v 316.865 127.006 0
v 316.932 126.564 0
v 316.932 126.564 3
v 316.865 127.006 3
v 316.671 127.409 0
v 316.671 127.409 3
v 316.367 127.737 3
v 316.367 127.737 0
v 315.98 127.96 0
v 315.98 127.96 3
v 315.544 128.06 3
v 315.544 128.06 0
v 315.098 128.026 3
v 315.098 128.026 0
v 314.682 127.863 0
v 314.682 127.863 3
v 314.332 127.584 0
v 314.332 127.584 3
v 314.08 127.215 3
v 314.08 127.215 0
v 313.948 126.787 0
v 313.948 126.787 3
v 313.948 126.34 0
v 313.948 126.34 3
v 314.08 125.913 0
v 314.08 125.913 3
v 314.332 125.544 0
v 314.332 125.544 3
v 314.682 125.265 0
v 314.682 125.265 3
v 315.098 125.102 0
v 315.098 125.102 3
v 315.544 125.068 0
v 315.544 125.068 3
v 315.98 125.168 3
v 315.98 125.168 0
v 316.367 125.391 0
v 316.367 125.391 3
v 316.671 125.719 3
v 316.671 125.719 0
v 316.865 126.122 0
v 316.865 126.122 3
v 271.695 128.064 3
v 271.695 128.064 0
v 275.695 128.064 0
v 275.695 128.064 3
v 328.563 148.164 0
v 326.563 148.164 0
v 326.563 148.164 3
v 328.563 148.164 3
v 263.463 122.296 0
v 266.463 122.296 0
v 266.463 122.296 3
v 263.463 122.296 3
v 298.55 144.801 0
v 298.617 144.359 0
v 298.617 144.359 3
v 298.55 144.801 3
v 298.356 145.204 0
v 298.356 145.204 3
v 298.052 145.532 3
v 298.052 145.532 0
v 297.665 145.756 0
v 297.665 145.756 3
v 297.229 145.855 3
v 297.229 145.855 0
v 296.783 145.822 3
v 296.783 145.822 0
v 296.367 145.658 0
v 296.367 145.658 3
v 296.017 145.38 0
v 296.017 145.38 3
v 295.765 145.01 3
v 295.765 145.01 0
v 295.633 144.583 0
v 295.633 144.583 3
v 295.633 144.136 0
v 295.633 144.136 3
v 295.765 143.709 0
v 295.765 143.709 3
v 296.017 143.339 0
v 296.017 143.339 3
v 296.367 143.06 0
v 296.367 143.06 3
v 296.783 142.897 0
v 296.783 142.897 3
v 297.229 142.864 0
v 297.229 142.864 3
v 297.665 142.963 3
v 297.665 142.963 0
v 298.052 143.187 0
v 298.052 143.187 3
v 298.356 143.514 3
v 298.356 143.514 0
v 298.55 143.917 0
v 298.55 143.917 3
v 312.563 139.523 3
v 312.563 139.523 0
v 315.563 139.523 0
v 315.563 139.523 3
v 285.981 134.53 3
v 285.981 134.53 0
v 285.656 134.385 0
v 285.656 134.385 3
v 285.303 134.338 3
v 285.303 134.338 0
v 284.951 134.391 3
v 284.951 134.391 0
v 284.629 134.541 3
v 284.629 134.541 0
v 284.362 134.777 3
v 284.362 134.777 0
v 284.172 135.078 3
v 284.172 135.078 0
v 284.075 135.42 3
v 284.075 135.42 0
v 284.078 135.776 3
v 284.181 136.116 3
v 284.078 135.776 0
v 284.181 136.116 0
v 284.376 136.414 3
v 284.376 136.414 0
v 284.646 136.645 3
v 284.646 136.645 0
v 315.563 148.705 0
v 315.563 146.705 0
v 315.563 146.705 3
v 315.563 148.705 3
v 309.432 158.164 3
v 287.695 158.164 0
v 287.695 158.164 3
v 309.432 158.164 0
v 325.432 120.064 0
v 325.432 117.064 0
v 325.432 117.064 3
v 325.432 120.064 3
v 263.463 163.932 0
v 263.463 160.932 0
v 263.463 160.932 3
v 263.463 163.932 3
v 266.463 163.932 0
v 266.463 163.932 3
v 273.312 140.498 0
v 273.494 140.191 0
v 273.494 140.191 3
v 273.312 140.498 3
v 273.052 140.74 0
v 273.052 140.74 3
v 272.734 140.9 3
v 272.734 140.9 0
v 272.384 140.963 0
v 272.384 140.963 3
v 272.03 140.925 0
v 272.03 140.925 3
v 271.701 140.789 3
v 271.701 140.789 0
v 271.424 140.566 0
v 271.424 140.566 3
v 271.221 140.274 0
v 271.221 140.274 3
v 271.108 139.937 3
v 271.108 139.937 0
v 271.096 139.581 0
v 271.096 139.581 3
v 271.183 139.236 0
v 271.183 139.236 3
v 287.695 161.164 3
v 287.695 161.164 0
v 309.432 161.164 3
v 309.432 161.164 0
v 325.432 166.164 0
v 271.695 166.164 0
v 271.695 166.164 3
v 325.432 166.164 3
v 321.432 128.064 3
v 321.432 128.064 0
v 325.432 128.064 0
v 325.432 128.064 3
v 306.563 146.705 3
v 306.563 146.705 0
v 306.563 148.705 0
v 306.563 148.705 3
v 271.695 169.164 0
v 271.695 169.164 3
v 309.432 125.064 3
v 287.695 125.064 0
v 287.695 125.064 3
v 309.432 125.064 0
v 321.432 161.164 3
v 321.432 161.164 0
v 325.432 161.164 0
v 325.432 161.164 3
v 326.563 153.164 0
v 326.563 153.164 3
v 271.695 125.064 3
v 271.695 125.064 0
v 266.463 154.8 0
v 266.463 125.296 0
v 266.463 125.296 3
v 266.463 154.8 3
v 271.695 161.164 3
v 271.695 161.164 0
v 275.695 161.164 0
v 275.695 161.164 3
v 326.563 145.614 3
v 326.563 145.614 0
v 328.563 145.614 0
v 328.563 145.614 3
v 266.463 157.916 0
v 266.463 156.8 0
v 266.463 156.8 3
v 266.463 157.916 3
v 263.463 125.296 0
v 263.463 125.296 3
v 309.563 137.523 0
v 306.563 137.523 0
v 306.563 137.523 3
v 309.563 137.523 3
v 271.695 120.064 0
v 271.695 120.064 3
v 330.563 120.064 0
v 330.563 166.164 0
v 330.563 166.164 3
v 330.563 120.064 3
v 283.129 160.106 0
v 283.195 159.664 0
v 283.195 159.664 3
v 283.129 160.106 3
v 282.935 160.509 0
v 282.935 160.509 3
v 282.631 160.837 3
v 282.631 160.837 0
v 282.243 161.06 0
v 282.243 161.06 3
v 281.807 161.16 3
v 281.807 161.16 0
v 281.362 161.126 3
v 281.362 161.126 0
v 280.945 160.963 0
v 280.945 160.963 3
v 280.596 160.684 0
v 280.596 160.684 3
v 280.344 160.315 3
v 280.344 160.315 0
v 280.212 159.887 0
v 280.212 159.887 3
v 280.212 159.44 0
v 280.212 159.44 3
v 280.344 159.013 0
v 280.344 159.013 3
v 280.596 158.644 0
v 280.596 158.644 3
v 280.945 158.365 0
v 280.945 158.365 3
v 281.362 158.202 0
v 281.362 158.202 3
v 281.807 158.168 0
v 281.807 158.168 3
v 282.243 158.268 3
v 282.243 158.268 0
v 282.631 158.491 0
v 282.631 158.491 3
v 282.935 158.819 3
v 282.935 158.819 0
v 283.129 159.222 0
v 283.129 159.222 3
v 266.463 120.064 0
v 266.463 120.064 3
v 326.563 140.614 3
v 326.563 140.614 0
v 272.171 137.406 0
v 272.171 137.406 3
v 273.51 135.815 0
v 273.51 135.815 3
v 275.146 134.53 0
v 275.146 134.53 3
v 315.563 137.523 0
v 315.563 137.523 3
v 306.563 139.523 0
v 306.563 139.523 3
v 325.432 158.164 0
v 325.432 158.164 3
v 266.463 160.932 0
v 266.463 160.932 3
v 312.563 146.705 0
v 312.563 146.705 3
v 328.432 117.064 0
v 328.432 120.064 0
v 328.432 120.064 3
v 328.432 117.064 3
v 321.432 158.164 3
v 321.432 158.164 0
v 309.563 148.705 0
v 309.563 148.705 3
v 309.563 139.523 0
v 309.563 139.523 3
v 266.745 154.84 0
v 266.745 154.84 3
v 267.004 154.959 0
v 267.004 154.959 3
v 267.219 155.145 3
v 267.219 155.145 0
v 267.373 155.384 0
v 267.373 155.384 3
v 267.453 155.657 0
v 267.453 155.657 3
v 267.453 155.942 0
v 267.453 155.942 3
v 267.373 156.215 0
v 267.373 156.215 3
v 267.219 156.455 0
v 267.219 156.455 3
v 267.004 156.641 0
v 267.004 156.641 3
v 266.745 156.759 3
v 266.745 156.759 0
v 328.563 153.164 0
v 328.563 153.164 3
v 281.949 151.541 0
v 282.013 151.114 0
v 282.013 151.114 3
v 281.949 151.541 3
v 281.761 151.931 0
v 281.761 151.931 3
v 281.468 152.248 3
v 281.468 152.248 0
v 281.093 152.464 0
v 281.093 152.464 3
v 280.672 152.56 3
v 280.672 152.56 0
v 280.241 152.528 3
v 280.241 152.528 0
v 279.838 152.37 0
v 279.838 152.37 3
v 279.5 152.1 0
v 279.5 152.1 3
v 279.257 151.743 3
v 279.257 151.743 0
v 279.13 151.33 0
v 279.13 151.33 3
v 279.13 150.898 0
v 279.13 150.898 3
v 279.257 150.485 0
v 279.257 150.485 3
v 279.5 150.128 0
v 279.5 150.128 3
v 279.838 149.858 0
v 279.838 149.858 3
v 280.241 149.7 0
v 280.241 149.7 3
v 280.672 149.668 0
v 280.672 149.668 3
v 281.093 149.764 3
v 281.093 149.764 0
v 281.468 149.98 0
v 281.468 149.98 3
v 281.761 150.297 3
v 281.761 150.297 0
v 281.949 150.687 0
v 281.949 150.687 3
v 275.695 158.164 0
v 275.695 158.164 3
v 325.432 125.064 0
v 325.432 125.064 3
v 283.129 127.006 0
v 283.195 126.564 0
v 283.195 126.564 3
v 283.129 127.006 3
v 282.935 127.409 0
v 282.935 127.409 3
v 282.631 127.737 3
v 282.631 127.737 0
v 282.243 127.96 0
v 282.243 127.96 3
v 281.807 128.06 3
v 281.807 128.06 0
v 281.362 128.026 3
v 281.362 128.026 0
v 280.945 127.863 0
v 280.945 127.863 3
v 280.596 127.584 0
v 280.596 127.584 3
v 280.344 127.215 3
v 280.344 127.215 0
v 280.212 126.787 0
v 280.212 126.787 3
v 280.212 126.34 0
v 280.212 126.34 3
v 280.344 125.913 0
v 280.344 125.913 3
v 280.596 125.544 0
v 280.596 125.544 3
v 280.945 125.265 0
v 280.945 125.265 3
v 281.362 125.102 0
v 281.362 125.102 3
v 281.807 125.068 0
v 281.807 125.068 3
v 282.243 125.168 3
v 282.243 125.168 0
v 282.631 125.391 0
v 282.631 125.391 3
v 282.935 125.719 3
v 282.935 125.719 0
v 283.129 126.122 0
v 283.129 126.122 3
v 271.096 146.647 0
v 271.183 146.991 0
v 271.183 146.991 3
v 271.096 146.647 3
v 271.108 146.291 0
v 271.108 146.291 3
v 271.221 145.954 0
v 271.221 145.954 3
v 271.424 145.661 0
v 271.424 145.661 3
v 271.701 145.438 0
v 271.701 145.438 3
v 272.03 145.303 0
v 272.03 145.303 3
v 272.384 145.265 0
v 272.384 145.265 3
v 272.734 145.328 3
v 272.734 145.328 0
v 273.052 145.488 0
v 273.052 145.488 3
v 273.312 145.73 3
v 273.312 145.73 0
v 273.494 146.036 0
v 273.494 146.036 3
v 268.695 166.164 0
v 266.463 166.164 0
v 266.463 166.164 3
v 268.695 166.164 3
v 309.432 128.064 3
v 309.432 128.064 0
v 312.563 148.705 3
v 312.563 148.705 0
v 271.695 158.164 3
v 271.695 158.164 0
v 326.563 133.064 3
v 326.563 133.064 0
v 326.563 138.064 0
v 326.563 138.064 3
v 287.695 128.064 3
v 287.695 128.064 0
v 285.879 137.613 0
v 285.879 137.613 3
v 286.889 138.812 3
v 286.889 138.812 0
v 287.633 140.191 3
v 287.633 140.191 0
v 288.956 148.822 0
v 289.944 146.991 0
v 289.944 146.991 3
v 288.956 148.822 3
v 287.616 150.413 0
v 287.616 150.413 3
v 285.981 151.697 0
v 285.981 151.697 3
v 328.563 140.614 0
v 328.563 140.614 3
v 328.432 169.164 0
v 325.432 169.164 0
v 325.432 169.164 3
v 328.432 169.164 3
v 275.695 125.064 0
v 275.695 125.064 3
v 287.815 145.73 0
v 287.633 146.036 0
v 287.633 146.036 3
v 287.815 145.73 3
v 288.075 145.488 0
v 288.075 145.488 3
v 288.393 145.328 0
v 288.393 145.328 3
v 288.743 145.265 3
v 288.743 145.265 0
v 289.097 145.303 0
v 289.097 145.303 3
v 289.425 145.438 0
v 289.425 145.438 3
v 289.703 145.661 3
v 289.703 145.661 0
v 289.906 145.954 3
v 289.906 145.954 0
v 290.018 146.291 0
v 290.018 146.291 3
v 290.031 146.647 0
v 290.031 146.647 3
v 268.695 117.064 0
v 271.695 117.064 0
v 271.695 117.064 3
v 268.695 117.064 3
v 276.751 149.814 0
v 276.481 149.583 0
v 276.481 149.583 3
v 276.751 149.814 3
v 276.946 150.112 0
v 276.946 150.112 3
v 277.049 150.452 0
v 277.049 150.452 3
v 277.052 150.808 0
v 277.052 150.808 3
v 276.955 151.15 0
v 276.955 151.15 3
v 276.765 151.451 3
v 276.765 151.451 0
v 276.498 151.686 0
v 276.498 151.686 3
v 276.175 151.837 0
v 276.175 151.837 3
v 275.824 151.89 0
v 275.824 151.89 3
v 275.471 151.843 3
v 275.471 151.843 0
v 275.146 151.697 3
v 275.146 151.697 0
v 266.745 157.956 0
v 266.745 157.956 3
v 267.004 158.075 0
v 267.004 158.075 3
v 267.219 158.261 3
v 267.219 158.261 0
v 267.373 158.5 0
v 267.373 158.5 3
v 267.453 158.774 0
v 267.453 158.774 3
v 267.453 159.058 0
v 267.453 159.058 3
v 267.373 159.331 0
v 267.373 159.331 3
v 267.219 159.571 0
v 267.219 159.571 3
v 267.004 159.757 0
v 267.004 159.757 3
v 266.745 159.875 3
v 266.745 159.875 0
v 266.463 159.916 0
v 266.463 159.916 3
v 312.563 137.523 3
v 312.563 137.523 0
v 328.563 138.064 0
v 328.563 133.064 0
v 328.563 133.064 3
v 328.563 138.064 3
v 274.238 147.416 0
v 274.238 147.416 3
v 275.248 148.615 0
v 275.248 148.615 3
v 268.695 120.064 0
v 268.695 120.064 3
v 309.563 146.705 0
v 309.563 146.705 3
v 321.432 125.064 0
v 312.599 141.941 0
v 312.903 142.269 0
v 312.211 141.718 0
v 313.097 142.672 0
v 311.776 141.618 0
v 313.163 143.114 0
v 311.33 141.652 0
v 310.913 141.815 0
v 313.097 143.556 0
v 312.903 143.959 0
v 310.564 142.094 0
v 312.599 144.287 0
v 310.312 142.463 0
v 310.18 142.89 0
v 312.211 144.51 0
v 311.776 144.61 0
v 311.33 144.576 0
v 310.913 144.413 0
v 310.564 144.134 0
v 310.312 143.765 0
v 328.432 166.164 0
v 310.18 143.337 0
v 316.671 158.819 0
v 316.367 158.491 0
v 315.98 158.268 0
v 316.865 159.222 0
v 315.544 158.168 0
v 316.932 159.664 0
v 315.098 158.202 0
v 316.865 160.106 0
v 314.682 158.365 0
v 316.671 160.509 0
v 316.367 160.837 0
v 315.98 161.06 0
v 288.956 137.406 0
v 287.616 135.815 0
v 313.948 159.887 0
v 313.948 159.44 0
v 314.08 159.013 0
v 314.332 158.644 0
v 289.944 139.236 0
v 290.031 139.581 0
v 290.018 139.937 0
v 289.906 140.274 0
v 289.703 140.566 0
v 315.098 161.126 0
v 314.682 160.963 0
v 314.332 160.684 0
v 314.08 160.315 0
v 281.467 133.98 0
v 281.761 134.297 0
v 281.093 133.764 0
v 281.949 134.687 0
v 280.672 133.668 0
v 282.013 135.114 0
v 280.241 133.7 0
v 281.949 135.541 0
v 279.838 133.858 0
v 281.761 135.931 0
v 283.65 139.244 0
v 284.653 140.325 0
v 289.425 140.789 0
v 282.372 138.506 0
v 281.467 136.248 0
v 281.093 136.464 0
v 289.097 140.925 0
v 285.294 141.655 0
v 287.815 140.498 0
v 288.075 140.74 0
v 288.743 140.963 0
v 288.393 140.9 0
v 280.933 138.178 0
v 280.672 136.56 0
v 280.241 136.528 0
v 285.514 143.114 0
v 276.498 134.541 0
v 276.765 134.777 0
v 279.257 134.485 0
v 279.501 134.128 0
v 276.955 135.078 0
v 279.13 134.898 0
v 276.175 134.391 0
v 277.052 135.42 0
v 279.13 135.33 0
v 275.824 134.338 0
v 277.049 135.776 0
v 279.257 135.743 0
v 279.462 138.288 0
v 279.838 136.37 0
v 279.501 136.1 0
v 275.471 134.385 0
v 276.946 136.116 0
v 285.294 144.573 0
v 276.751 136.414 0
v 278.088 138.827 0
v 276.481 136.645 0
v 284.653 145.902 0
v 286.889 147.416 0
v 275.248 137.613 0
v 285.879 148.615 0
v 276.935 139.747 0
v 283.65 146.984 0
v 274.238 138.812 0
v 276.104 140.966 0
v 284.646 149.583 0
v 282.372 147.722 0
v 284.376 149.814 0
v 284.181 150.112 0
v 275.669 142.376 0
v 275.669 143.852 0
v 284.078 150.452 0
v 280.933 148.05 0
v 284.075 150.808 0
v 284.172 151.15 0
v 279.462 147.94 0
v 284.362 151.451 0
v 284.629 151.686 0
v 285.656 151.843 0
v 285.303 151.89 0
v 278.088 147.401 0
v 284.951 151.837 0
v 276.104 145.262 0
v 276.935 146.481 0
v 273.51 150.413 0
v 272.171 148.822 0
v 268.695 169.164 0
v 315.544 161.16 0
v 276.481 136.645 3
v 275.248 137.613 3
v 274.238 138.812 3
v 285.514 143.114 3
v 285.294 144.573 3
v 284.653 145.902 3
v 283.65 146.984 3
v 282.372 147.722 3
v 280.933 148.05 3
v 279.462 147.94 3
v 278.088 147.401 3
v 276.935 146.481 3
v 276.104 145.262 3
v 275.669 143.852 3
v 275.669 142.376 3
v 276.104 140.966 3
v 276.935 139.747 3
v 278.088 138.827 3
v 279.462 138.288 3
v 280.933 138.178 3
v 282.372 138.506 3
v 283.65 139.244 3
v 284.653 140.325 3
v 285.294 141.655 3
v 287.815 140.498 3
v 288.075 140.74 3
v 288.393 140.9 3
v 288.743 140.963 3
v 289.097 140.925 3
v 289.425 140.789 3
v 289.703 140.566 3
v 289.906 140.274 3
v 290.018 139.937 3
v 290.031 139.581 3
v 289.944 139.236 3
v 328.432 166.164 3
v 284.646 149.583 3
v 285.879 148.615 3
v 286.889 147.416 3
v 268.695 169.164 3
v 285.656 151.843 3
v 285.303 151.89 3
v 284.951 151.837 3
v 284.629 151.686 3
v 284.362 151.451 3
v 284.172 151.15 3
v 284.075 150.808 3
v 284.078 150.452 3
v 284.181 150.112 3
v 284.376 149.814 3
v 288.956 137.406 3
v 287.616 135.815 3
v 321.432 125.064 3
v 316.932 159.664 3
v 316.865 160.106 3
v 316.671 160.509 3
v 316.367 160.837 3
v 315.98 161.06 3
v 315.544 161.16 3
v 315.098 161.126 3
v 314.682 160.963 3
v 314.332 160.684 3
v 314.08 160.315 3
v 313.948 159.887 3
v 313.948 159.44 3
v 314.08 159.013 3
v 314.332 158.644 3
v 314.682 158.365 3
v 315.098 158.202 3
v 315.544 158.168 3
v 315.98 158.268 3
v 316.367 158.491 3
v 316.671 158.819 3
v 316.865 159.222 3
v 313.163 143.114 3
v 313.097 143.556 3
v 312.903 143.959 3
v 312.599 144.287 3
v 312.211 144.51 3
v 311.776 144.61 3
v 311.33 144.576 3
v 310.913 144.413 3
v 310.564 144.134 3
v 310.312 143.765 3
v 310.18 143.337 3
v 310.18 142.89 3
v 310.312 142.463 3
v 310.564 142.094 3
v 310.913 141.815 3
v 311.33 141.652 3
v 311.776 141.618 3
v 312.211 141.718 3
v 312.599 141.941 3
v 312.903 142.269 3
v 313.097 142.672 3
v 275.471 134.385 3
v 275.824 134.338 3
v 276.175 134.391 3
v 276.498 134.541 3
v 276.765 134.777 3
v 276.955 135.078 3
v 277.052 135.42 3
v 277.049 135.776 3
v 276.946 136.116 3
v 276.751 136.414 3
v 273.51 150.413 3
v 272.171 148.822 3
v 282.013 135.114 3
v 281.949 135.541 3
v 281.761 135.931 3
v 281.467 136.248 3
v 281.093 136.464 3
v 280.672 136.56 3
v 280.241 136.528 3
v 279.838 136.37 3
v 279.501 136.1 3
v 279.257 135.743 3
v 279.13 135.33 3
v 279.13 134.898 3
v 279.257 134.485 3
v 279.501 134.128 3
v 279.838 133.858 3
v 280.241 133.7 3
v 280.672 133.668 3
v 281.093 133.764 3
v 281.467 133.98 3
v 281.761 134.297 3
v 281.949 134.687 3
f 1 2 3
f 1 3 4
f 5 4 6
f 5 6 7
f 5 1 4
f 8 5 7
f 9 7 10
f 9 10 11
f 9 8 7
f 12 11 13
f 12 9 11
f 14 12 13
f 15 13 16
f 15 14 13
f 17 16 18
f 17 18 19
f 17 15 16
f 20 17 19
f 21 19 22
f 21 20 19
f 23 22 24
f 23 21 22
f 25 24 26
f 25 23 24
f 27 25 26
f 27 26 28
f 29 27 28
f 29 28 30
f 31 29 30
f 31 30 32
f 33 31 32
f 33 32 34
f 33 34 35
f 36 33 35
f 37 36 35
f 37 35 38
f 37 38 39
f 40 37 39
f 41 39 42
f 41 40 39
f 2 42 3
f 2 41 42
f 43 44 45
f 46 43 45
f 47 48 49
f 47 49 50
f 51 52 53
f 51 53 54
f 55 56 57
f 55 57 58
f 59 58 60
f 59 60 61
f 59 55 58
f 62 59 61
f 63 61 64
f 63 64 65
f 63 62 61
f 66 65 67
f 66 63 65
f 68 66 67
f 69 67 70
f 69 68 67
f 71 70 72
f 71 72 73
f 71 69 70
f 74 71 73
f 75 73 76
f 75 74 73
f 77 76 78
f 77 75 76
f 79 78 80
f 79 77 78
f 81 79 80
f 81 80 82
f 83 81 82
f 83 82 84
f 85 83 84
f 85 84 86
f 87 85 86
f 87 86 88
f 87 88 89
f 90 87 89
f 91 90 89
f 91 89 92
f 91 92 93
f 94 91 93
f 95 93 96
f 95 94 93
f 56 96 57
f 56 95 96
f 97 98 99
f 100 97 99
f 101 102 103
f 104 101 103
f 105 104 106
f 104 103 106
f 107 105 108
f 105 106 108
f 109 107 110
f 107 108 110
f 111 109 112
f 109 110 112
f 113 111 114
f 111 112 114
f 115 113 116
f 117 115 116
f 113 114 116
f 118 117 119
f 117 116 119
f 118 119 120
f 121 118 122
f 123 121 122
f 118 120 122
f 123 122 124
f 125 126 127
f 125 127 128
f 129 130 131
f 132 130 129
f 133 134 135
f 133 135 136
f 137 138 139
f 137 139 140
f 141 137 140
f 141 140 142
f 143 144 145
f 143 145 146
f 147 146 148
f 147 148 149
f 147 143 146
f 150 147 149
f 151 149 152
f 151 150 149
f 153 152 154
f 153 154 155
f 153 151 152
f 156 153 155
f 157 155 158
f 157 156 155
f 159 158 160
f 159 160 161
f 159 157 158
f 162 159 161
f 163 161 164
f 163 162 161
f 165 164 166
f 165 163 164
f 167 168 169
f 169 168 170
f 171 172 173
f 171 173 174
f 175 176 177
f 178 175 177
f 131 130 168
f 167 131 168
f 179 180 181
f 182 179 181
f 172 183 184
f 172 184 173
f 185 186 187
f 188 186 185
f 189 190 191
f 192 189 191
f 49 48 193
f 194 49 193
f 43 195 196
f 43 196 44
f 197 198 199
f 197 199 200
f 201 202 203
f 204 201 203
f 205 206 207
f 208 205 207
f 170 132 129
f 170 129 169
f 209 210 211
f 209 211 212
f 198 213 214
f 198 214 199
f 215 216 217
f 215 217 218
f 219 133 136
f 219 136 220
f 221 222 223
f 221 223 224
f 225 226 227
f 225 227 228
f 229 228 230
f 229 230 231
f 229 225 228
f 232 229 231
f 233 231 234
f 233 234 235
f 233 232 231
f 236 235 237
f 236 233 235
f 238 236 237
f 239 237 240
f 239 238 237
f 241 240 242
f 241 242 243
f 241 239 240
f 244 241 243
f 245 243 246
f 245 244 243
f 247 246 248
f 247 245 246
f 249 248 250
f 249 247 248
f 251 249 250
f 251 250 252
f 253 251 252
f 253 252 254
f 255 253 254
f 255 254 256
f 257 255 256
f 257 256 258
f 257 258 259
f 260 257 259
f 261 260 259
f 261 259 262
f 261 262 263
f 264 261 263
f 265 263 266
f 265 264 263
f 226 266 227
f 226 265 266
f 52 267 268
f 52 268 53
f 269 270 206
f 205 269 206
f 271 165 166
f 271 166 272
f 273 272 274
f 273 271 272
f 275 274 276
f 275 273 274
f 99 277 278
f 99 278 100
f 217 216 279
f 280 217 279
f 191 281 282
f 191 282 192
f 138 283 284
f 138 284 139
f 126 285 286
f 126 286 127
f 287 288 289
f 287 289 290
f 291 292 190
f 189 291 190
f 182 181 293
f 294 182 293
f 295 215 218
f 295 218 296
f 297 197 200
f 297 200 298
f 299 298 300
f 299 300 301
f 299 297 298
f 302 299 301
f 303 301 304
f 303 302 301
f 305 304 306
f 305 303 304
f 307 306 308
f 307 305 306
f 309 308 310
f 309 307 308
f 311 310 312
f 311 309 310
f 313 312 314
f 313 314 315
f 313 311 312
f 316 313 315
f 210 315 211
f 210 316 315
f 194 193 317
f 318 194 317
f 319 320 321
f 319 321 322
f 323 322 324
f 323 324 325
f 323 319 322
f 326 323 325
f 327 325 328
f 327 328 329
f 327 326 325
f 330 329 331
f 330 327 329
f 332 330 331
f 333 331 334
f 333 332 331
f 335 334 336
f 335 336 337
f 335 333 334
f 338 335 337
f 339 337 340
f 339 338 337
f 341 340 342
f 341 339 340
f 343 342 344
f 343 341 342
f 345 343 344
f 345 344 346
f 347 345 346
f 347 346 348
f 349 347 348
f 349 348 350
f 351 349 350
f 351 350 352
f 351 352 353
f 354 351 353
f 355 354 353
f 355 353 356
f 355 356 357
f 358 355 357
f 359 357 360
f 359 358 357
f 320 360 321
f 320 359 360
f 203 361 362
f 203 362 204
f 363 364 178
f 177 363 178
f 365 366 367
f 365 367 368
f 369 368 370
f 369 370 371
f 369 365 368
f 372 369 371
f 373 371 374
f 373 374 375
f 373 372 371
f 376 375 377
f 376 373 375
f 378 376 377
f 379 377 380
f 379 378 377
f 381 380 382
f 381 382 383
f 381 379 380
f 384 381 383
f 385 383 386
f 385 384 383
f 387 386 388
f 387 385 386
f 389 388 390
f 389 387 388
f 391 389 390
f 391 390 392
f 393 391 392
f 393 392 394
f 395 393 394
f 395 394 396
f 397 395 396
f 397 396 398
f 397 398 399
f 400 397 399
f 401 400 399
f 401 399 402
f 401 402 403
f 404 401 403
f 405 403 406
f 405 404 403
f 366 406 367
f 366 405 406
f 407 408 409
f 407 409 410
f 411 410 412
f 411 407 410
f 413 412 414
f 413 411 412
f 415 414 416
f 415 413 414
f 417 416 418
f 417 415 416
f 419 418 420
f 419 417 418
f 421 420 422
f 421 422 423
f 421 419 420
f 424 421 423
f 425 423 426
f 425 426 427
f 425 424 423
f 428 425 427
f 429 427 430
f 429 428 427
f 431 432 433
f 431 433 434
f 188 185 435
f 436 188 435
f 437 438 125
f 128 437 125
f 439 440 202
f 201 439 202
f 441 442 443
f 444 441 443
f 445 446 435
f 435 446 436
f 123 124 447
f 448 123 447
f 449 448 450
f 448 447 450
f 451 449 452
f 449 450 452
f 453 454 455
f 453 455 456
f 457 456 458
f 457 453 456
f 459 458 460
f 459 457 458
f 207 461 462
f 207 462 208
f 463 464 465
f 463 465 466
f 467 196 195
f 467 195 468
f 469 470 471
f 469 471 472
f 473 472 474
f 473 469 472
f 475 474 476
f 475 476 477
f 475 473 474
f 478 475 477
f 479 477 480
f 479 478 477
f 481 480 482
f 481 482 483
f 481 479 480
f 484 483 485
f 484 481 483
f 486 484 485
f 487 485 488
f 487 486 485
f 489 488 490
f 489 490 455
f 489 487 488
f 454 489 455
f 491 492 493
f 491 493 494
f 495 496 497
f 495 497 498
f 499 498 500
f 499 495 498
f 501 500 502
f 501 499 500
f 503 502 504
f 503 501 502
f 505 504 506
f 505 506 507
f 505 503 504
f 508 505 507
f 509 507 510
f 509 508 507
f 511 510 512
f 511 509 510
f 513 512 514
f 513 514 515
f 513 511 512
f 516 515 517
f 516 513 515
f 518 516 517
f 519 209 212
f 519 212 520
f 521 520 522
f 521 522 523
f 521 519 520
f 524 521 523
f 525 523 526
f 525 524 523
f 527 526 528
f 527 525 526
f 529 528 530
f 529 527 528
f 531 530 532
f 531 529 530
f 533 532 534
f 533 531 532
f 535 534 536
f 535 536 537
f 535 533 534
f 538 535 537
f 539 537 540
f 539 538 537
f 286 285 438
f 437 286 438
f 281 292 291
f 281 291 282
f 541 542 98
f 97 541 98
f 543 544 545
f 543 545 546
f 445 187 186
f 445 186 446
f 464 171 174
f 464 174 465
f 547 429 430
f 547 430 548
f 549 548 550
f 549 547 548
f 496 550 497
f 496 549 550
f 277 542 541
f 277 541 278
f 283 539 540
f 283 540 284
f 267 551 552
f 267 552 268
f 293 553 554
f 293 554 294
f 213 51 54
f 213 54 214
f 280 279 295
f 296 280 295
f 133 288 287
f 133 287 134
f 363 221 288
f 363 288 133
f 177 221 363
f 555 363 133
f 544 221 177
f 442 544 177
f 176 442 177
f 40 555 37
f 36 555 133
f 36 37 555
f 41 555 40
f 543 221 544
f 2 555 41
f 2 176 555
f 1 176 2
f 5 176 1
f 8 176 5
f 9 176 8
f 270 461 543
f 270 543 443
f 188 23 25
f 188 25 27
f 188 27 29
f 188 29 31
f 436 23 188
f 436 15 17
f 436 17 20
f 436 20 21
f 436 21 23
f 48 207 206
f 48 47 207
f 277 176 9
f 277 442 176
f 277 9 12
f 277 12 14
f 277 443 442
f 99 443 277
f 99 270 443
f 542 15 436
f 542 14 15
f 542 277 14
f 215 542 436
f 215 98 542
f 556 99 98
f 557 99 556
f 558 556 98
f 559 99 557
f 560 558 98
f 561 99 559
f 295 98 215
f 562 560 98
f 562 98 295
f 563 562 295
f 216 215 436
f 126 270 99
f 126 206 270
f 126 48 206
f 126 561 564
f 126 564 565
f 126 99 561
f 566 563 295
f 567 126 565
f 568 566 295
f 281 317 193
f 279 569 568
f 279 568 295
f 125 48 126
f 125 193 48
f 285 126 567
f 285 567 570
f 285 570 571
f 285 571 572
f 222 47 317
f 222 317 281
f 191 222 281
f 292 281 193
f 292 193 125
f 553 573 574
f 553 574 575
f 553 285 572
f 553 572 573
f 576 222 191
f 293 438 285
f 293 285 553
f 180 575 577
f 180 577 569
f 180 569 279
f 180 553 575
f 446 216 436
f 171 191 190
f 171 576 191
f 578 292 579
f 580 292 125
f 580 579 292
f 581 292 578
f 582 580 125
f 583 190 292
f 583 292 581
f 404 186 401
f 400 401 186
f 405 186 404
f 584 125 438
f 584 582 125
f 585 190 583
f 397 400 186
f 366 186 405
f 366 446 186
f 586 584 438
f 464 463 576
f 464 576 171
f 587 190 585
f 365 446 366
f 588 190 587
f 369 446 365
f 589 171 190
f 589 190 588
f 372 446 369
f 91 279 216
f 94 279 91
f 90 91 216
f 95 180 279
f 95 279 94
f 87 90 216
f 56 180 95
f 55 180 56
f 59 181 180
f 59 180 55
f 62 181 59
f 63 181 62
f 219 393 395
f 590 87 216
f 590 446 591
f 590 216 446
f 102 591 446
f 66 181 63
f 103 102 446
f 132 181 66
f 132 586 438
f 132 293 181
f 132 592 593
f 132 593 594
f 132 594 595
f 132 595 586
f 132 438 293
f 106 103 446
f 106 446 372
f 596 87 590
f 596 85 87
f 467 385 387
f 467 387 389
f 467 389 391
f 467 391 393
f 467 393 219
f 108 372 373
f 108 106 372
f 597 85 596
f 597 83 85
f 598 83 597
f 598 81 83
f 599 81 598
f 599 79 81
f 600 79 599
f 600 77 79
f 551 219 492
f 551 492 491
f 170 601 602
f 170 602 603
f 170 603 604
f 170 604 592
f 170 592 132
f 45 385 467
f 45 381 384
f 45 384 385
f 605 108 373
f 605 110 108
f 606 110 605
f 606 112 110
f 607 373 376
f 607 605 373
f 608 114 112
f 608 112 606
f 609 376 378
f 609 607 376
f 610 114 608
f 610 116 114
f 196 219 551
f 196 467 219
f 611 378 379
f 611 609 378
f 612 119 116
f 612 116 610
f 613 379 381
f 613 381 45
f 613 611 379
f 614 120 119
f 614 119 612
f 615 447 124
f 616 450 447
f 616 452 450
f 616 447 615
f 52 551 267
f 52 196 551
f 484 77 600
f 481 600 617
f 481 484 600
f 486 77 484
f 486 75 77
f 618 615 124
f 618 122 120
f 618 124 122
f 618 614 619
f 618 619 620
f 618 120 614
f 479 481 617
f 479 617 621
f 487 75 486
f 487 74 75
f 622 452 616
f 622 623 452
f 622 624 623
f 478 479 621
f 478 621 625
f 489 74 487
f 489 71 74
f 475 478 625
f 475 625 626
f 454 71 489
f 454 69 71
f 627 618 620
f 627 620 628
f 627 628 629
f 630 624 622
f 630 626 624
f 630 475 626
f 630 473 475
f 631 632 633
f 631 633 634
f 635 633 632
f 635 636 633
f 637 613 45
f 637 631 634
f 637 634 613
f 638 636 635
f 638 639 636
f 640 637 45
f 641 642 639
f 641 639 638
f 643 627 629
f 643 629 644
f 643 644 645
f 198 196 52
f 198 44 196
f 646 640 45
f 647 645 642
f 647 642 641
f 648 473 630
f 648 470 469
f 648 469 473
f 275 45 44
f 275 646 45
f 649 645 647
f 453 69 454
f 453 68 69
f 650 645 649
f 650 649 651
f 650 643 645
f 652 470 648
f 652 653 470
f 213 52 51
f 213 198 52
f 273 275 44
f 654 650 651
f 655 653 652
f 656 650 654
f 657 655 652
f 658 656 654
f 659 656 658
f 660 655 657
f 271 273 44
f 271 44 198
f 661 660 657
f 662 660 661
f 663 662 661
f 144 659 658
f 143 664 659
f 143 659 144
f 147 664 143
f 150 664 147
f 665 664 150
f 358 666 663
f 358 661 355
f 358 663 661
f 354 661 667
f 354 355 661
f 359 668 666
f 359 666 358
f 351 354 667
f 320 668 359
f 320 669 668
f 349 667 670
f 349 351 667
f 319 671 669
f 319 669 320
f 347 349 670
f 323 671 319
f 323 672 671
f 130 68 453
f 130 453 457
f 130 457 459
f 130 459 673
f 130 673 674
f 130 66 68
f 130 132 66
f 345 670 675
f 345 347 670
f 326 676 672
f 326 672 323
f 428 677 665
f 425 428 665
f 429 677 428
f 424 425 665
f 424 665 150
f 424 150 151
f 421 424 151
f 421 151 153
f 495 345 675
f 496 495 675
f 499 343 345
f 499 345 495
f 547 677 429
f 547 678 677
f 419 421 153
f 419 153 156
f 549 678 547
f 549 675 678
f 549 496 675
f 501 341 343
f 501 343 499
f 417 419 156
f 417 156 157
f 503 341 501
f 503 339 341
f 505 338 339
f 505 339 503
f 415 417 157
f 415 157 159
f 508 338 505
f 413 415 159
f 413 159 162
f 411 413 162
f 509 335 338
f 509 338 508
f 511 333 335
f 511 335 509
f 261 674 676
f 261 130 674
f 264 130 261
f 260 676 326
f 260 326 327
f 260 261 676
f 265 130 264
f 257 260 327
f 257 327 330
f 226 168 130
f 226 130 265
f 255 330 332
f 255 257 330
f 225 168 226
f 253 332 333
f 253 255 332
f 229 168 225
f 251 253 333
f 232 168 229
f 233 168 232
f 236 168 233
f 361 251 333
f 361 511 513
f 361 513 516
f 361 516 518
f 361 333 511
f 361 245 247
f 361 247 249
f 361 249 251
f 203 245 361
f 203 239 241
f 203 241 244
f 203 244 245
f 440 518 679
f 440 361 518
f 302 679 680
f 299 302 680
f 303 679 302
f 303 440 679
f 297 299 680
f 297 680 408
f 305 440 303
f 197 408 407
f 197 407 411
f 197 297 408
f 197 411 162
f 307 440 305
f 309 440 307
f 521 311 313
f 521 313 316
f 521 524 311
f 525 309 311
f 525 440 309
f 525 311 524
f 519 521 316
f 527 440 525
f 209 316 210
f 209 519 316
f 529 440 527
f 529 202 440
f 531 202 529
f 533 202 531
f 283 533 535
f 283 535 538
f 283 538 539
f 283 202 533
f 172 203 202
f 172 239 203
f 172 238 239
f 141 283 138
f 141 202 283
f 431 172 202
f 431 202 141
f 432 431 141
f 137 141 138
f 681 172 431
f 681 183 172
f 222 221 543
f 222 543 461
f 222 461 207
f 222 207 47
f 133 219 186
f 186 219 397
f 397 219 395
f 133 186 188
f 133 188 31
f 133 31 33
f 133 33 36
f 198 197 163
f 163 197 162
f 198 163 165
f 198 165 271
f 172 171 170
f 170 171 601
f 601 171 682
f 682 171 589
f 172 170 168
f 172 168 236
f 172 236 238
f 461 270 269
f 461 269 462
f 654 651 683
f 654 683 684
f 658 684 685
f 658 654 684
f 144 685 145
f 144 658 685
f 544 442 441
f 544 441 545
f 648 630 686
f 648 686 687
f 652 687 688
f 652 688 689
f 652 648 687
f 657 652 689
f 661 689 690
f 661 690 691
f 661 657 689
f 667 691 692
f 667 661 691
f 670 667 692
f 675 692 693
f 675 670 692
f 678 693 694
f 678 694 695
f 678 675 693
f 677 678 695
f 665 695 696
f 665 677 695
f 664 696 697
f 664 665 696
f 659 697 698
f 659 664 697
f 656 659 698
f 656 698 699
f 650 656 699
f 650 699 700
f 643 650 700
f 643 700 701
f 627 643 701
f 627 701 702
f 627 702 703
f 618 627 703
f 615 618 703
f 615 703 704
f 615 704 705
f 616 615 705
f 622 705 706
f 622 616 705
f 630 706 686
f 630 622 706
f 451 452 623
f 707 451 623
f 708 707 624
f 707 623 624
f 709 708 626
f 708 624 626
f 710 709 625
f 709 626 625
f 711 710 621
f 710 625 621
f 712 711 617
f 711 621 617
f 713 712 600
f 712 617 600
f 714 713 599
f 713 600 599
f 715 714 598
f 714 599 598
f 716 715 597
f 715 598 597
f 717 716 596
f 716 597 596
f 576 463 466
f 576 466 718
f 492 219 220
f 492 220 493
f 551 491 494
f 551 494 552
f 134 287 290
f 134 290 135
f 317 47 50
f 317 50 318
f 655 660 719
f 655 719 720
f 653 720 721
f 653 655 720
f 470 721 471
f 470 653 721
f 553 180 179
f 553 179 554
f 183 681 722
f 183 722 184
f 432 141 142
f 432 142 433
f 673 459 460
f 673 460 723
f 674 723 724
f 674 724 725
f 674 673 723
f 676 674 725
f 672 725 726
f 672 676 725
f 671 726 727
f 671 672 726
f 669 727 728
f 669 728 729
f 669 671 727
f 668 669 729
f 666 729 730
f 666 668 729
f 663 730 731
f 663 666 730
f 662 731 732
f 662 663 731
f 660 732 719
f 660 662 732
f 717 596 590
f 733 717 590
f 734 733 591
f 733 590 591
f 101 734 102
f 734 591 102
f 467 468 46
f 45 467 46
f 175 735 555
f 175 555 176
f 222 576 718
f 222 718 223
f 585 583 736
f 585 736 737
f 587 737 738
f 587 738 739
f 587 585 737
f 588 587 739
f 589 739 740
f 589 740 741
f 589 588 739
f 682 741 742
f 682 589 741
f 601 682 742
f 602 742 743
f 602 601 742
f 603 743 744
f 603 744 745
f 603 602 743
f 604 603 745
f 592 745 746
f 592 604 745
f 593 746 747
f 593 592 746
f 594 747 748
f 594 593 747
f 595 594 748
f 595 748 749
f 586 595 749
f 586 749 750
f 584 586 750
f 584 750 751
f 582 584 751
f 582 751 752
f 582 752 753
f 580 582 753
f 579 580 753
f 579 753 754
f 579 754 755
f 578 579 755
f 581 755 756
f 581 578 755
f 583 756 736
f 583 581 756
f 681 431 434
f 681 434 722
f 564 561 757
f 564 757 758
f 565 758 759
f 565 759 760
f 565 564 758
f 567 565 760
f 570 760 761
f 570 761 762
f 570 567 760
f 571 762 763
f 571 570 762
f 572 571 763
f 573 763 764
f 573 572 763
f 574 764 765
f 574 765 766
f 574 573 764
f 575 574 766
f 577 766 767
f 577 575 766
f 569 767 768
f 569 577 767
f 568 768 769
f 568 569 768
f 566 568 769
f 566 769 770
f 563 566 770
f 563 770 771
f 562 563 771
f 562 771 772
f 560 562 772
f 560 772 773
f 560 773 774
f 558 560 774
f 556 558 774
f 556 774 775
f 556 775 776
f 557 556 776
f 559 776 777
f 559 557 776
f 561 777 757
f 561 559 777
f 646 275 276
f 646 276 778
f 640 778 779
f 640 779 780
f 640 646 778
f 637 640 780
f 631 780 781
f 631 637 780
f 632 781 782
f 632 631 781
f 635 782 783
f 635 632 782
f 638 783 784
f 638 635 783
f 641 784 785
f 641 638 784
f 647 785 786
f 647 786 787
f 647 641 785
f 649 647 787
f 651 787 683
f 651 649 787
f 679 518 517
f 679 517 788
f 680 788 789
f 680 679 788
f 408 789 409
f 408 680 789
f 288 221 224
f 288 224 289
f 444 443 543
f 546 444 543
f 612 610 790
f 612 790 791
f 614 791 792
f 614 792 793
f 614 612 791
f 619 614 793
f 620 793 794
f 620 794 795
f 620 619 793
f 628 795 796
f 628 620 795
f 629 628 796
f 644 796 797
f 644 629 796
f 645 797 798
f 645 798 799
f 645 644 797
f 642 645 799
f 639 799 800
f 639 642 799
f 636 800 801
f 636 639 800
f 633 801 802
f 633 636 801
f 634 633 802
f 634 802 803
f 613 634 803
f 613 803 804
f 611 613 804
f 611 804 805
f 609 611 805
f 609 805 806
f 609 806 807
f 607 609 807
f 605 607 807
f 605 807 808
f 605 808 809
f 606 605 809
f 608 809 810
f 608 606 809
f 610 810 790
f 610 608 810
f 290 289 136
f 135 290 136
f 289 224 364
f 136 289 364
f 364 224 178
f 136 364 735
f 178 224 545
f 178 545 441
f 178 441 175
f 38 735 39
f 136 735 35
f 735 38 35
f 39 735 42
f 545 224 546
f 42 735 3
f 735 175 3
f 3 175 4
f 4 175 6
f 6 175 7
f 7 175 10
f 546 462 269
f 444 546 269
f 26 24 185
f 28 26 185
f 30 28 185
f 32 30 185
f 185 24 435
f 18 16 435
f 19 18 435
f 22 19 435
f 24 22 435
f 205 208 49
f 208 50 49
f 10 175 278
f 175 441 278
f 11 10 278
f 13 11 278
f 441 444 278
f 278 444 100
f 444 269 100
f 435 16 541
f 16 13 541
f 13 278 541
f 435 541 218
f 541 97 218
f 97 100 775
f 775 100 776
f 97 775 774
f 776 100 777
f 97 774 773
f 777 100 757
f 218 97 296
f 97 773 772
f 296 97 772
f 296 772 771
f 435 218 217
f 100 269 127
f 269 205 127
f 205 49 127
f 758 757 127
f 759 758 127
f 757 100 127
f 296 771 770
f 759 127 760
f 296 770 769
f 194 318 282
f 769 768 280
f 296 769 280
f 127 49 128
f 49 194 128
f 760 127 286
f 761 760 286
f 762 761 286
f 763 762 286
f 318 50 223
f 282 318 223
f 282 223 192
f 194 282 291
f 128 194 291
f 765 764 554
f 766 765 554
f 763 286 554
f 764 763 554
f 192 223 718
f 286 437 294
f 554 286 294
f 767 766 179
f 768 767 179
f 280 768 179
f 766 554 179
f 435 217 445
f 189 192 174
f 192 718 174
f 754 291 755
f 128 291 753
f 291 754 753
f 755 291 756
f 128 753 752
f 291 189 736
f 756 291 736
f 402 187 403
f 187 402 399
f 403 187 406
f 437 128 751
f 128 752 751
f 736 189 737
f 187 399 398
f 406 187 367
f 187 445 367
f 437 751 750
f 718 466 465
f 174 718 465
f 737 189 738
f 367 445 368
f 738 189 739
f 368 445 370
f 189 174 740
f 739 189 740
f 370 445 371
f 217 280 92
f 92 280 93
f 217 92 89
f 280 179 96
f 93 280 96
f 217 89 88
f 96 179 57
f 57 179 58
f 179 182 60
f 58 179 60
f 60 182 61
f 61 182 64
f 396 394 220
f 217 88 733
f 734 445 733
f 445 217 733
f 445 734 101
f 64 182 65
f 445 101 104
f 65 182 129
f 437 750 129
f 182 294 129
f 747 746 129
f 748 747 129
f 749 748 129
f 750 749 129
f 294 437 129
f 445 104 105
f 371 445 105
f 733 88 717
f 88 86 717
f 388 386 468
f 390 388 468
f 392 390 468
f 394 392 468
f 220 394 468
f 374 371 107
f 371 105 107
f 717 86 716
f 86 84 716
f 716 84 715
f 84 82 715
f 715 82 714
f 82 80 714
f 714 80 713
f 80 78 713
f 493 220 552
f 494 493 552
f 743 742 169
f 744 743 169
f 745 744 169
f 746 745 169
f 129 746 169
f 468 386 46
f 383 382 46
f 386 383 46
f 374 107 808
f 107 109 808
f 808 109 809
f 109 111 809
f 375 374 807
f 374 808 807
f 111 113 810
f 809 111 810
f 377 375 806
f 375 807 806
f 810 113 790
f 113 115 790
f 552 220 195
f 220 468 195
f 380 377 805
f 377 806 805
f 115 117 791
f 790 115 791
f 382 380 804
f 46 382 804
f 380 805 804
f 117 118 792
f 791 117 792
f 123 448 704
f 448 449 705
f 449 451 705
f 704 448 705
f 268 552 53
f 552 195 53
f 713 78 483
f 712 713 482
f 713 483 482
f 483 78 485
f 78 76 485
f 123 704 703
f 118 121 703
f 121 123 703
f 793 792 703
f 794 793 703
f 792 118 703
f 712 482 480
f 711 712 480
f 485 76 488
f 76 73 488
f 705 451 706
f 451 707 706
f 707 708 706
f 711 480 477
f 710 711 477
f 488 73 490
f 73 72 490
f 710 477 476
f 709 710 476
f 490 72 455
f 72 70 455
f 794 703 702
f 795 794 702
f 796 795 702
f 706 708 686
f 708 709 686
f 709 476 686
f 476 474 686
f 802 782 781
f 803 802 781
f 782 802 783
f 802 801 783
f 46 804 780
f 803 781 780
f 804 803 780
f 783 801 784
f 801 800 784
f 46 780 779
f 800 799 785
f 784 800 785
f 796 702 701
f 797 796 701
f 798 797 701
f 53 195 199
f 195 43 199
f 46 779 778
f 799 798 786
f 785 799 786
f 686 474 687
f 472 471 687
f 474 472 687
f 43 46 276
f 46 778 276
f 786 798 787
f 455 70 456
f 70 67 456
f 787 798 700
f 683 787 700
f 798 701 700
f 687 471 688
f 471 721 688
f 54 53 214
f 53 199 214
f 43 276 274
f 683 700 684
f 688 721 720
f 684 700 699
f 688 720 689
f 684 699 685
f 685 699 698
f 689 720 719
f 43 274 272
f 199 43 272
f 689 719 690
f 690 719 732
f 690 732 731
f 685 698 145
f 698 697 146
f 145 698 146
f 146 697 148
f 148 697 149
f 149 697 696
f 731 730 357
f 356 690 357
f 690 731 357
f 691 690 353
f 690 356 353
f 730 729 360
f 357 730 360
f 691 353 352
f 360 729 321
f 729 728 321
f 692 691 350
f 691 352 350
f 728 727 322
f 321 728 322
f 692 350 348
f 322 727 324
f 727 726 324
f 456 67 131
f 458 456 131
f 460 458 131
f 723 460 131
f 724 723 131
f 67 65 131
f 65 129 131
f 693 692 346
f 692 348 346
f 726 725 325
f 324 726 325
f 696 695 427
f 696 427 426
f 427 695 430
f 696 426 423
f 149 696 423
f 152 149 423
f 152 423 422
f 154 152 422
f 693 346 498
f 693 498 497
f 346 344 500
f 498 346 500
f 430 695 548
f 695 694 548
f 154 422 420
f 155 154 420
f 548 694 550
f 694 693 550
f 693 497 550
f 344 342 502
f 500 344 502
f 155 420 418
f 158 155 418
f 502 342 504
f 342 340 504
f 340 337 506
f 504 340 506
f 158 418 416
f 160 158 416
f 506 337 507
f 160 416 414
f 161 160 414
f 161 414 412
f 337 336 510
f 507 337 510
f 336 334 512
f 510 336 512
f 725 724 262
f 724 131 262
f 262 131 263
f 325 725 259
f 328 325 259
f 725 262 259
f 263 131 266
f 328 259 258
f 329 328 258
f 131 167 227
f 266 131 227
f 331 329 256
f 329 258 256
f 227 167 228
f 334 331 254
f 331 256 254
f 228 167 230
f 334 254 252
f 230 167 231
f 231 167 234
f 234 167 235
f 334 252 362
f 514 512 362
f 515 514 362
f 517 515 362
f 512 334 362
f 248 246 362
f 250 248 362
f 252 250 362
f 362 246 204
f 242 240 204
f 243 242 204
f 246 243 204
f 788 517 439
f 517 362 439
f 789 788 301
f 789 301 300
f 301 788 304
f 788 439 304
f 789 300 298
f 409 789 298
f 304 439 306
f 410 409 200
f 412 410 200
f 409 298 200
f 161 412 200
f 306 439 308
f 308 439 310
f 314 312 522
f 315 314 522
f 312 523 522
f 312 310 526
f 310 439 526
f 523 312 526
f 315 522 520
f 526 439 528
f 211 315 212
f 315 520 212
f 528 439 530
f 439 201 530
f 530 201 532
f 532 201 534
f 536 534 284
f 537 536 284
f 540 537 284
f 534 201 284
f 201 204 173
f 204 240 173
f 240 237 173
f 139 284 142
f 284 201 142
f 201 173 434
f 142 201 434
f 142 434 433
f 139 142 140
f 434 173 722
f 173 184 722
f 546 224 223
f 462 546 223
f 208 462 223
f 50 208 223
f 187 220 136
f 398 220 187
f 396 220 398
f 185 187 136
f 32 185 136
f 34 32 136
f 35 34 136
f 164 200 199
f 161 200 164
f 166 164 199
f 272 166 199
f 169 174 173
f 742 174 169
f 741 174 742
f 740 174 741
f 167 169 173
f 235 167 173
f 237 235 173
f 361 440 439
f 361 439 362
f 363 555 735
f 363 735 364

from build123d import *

# Parameters (mm, degrees)
MODEL_R             = 4.950133
MODEL_R_2           = 1.45002
MODEL_R_3           = 1.45
MODEL_R_4           = 1.5
MODEL_W             = 4
MODEL_H             = 3
MODEL_W_2           = 21.736231
MODEL_W_3           = 3
MODEL_H_2           = 2
MODEL_W_4           = 2
MODEL_H_3           = 5
BOSS_EXTRUDE1_DEPTH = 3


with BuildPart() as part:
    # Model → Boss-Extrude1 (new body)
    with BuildSketch(Plane.XY):
        with BuildLine():
            Line((330.563429791, 166.163919592), (330.563429791, 120.063919592))
            Line((330.563429791, 120.063919592), (328.431544791, 120.063919592))
            Line((328.431544791, 120.063919592), (328.431544791, 117.063919592))
            Line((328.431544791, 117.063919592), (325.431544791, 117.063919592))
            Line((325.431544791, 117.063919592), (325.431544791, 120.063919592))
            Line((325.431544791, 120.063919592), (271.695313791, 120.063919592))
            Line((271.695313791, 120.063919592), (271.695313791, 117.063919592))
            Line((271.695313791, 117.063919592), (268.695313791, 117.063919592))
            Line((268.695313791, 117.063919592), (268.695313791, 120.063919592))
            Line((268.695313791, 120.063919592), (266.463429791, 120.063919592))
            Line((266.463429791, 120.063919592), (266.463429791, 122.295819592))
            Line((266.463429791, 122.295819592), (263.463429791, 122.295819592))
            Line((263.463429791, 122.295819592), (263.463429791, 125.295819592))
            Line((263.463429791, 125.295819592), (266.463429791, 125.295819592))
            Line((266.463429791, 125.295819592), (266.463429791, 154.799800566))
            ThreePointArc((266.463429791, 154.799800566), (267.463429791, 155.799800566), (266.463429791, 156.799800566))
            Line((266.463429791, 156.799800566), (266.463429791, 157.915840878))
            ThreePointArc((266.463429791, 157.915840878), (267.463429791, 158.915840878), (266.463429791, 159.915840878))
            Line((266.463429791, 159.915840878), (266.463429791, 160.932019592))
            Line((266.463429791, 160.932019592), (263.463429791, 160.932019592))
            Line((263.463429791, 160.932019592), (263.463429791, 163.932019592))
            Line((263.463429791, 163.932019592), (266.463429791, 163.932019592))
            Line((266.463429791, 163.932019592), (266.463429791, 166.163919592))
            Line((266.463429791, 166.163919592), (268.695313791, 166.163919592))
            Line((268.695313791, 166.163919592), (268.695313791, 169.163919592))
            Line((268.695313791, 169.163919592), (271.695313791, 169.163919592))
            Line((271.695313791, 169.163919592), (271.695313791, 166.163919592))
            Line((271.695313791, 166.163919592), (325.431544791, 166.163919592))
            Line((325.431544791, 166.163919592), (325.431544791, 169.163919592))
            Line((325.431544791, 169.163919592), (328.431544791, 169.163919592))
            Line((328.431544791, 169.163919592), (328.431544791, 166.163919592))
            Line((328.431544791, 166.163919592), (330.563429791, 166.163919592))
        make_face()
        with Locations((280.563429657, 143.113919537)):
            Circle(MODEL_R, mode=Mode.SUBTRACT)
        with Locations((280.563429791, 151.113919592)):
            Circle(MODEL_R_2, mode=Mode.SUBTRACT)
        with Locations((280.563429791, 135.113919592)):
            Circle(MODEL_R_3, mode=Mode.SUBTRACT)
        with Locations((315.431544791, 159.663919592)):
            Circle(MODEL_R_4, mode=Mode.SUBTRACT)
        with Locations((281.695313791, 159.663919592)):
            Circle(MODEL_R_4, mode=Mode.SUBTRACT)
        with Locations((315.431544791, 126.563919592)):
            Circle(MODEL_R_4, mode=Mode.SUBTRACT)
        with Locations((281.695313791, 126.563919592)):
            Circle(MODEL_R_4, mode=Mode.SUBTRACT)
        with Locations((311.663429791, 143.113919592)):
            Circle(MODEL_R_4, mode=Mode.SUBTRACT)
        with Locations((297.116645225, 144.3593347)):
            Circle(MODEL_R_4, mode=Mode.SUBTRACT)
        with Locations((273.695313791, 159.663919592)):
            Rectangle(MODEL_W, MODEL_H, mode=Mode.SUBTRACT)
        with Locations((298.563429291, 159.663919592)):
            Rectangle(MODEL_W_2, MODEL_H, mode=Mode.SUBTRACT)
        with Locations((323.431544791, 159.663919592)):
            Rectangle(MODEL_W, MODEL_H, mode=Mode.SUBTRACT)
        with Locations((273.695313791, 126.563919592)):
            Rectangle(MODEL_W, MODEL_H, mode=Mode.SUBTRACT)
        with Locations((298.563429291, 126.563919592)):
            Rectangle(MODEL_W_2, MODEL_H, mode=Mode.SUBTRACT)
        with Locations((323.431544791, 126.563919592)):
            Rectangle(MODEL_W, MODEL_H, mode=Mode.SUBTRACT)
        with Locations((314.063465132, 147.705010706)):
            Rectangle(MODEL_W_3, MODEL_H_2, mode=Mode.SUBTRACT)
        with Locations((308.063465132, 147.705010706)):
            Rectangle(MODEL_W_3, MODEL_H_2, mode=Mode.SUBTRACT)
        with Locations((314.063465132, 138.522828477)):
            Rectangle(MODEL_W_3, MODEL_H_2, mode=Mode.SUBTRACT)
        with Locations((308.063465132, 138.522828477)):
            Rectangle(MODEL_W_3, MODEL_H_2, mode=Mode.SUBTRACT)
        with Locations((327.563465132, 150.663919592)):
            Rectangle(MODEL_W_4, MODEL_H_3, mode=Mode.SUBTRACT)
        with Locations((327.563465132, 143.113919592)):
            Rectangle(MODEL_W_4, MODEL_H_3, mode=Mode.SUBTRACT)
        with Locations((327.563465132, 135.563919592)):
            Rectangle(MODEL_W_4, MODEL_H_3, mode=Mode.SUBTRACT)
        with BuildLine():
            ThreePointArc((275.146294982, 151.69745945), (272.799630894, 149.651957033), (271.18327611, 146.991447741))
            ThreePointArc((271.18327611, 146.991447741), (271.860939302, 145.358728353), (273.49365869, 146.036391545))
            ThreePointArc((273.49365869, 146.036391545), (274.711896566, 148.041603035), (276.48056463, 149.583287152))
            ThreePointArc((276.48056463, 149.583287152), (276.870515955, 151.307508126), (275.146294982, 151.69745945))
        make_face(mode=Mode.SUBTRACT)
        with BuildLine():
            ThreePointArc((271.183276501, 139.236391494), (272.799631045, 136.575882517), (275.146294756, 134.530380266))
            ThreePointArc((275.146294756, 134.530380266), (276.870515729, 134.92033159), (276.480564405, 136.644552563))
            ThreePointArc((276.480564405, 136.644552563), (274.711896718, 138.186236515), (273.493659081, 140.191447689))
            ThreePointArc((273.493659081, 140.191447689), (271.860939693, 140.869110881), (271.183276501, 139.236391494))
        make_face(mode=Mode.SUBTRACT)
        with BuildLine():
            ThreePointArc((289.943583204, 146.991447741), (288.327228421, 149.651957033), (285.980564333, 151.69745945))
            ThreePointArc((285.980564333, 151.69745945), (284.25634336, 151.307508126), (284.646294684, 149.583287152))
            ThreePointArc((284.646294684, 149.583287152), (286.414962749, 148.041603035), (287.633200625, 146.036391545))
            ThreePointArc((287.633200625, 146.036391545), (289.265920012, 145.358728353), (289.943583204, 146.991447741))
        make_face(mode=Mode.SUBTRACT)
        with BuildLine():
            ThreePointArc((284.64629491, 136.644552563), (286.414962597, 138.186236515), (287.633200234, 140.191447689))
            ThreePointArc((287.633200234, 140.191447689), (289.265919735, 140.869110884), (289.94358293, 139.236391383))
            ThreePointArc((289.94358293, 139.236391383), (288.327228286, 136.575882304), (285.980564432, 134.530380008))
            ThreePointArc((285.980564432, 134.530380008), (284.256343393, 134.920331525), (284.64629491, 136.644552563))
        make_face(mode=Mode.SUBTRACT)
    extrude(amount=BOSS_EXTRUDE1_DEPTH)


solid = part.part
